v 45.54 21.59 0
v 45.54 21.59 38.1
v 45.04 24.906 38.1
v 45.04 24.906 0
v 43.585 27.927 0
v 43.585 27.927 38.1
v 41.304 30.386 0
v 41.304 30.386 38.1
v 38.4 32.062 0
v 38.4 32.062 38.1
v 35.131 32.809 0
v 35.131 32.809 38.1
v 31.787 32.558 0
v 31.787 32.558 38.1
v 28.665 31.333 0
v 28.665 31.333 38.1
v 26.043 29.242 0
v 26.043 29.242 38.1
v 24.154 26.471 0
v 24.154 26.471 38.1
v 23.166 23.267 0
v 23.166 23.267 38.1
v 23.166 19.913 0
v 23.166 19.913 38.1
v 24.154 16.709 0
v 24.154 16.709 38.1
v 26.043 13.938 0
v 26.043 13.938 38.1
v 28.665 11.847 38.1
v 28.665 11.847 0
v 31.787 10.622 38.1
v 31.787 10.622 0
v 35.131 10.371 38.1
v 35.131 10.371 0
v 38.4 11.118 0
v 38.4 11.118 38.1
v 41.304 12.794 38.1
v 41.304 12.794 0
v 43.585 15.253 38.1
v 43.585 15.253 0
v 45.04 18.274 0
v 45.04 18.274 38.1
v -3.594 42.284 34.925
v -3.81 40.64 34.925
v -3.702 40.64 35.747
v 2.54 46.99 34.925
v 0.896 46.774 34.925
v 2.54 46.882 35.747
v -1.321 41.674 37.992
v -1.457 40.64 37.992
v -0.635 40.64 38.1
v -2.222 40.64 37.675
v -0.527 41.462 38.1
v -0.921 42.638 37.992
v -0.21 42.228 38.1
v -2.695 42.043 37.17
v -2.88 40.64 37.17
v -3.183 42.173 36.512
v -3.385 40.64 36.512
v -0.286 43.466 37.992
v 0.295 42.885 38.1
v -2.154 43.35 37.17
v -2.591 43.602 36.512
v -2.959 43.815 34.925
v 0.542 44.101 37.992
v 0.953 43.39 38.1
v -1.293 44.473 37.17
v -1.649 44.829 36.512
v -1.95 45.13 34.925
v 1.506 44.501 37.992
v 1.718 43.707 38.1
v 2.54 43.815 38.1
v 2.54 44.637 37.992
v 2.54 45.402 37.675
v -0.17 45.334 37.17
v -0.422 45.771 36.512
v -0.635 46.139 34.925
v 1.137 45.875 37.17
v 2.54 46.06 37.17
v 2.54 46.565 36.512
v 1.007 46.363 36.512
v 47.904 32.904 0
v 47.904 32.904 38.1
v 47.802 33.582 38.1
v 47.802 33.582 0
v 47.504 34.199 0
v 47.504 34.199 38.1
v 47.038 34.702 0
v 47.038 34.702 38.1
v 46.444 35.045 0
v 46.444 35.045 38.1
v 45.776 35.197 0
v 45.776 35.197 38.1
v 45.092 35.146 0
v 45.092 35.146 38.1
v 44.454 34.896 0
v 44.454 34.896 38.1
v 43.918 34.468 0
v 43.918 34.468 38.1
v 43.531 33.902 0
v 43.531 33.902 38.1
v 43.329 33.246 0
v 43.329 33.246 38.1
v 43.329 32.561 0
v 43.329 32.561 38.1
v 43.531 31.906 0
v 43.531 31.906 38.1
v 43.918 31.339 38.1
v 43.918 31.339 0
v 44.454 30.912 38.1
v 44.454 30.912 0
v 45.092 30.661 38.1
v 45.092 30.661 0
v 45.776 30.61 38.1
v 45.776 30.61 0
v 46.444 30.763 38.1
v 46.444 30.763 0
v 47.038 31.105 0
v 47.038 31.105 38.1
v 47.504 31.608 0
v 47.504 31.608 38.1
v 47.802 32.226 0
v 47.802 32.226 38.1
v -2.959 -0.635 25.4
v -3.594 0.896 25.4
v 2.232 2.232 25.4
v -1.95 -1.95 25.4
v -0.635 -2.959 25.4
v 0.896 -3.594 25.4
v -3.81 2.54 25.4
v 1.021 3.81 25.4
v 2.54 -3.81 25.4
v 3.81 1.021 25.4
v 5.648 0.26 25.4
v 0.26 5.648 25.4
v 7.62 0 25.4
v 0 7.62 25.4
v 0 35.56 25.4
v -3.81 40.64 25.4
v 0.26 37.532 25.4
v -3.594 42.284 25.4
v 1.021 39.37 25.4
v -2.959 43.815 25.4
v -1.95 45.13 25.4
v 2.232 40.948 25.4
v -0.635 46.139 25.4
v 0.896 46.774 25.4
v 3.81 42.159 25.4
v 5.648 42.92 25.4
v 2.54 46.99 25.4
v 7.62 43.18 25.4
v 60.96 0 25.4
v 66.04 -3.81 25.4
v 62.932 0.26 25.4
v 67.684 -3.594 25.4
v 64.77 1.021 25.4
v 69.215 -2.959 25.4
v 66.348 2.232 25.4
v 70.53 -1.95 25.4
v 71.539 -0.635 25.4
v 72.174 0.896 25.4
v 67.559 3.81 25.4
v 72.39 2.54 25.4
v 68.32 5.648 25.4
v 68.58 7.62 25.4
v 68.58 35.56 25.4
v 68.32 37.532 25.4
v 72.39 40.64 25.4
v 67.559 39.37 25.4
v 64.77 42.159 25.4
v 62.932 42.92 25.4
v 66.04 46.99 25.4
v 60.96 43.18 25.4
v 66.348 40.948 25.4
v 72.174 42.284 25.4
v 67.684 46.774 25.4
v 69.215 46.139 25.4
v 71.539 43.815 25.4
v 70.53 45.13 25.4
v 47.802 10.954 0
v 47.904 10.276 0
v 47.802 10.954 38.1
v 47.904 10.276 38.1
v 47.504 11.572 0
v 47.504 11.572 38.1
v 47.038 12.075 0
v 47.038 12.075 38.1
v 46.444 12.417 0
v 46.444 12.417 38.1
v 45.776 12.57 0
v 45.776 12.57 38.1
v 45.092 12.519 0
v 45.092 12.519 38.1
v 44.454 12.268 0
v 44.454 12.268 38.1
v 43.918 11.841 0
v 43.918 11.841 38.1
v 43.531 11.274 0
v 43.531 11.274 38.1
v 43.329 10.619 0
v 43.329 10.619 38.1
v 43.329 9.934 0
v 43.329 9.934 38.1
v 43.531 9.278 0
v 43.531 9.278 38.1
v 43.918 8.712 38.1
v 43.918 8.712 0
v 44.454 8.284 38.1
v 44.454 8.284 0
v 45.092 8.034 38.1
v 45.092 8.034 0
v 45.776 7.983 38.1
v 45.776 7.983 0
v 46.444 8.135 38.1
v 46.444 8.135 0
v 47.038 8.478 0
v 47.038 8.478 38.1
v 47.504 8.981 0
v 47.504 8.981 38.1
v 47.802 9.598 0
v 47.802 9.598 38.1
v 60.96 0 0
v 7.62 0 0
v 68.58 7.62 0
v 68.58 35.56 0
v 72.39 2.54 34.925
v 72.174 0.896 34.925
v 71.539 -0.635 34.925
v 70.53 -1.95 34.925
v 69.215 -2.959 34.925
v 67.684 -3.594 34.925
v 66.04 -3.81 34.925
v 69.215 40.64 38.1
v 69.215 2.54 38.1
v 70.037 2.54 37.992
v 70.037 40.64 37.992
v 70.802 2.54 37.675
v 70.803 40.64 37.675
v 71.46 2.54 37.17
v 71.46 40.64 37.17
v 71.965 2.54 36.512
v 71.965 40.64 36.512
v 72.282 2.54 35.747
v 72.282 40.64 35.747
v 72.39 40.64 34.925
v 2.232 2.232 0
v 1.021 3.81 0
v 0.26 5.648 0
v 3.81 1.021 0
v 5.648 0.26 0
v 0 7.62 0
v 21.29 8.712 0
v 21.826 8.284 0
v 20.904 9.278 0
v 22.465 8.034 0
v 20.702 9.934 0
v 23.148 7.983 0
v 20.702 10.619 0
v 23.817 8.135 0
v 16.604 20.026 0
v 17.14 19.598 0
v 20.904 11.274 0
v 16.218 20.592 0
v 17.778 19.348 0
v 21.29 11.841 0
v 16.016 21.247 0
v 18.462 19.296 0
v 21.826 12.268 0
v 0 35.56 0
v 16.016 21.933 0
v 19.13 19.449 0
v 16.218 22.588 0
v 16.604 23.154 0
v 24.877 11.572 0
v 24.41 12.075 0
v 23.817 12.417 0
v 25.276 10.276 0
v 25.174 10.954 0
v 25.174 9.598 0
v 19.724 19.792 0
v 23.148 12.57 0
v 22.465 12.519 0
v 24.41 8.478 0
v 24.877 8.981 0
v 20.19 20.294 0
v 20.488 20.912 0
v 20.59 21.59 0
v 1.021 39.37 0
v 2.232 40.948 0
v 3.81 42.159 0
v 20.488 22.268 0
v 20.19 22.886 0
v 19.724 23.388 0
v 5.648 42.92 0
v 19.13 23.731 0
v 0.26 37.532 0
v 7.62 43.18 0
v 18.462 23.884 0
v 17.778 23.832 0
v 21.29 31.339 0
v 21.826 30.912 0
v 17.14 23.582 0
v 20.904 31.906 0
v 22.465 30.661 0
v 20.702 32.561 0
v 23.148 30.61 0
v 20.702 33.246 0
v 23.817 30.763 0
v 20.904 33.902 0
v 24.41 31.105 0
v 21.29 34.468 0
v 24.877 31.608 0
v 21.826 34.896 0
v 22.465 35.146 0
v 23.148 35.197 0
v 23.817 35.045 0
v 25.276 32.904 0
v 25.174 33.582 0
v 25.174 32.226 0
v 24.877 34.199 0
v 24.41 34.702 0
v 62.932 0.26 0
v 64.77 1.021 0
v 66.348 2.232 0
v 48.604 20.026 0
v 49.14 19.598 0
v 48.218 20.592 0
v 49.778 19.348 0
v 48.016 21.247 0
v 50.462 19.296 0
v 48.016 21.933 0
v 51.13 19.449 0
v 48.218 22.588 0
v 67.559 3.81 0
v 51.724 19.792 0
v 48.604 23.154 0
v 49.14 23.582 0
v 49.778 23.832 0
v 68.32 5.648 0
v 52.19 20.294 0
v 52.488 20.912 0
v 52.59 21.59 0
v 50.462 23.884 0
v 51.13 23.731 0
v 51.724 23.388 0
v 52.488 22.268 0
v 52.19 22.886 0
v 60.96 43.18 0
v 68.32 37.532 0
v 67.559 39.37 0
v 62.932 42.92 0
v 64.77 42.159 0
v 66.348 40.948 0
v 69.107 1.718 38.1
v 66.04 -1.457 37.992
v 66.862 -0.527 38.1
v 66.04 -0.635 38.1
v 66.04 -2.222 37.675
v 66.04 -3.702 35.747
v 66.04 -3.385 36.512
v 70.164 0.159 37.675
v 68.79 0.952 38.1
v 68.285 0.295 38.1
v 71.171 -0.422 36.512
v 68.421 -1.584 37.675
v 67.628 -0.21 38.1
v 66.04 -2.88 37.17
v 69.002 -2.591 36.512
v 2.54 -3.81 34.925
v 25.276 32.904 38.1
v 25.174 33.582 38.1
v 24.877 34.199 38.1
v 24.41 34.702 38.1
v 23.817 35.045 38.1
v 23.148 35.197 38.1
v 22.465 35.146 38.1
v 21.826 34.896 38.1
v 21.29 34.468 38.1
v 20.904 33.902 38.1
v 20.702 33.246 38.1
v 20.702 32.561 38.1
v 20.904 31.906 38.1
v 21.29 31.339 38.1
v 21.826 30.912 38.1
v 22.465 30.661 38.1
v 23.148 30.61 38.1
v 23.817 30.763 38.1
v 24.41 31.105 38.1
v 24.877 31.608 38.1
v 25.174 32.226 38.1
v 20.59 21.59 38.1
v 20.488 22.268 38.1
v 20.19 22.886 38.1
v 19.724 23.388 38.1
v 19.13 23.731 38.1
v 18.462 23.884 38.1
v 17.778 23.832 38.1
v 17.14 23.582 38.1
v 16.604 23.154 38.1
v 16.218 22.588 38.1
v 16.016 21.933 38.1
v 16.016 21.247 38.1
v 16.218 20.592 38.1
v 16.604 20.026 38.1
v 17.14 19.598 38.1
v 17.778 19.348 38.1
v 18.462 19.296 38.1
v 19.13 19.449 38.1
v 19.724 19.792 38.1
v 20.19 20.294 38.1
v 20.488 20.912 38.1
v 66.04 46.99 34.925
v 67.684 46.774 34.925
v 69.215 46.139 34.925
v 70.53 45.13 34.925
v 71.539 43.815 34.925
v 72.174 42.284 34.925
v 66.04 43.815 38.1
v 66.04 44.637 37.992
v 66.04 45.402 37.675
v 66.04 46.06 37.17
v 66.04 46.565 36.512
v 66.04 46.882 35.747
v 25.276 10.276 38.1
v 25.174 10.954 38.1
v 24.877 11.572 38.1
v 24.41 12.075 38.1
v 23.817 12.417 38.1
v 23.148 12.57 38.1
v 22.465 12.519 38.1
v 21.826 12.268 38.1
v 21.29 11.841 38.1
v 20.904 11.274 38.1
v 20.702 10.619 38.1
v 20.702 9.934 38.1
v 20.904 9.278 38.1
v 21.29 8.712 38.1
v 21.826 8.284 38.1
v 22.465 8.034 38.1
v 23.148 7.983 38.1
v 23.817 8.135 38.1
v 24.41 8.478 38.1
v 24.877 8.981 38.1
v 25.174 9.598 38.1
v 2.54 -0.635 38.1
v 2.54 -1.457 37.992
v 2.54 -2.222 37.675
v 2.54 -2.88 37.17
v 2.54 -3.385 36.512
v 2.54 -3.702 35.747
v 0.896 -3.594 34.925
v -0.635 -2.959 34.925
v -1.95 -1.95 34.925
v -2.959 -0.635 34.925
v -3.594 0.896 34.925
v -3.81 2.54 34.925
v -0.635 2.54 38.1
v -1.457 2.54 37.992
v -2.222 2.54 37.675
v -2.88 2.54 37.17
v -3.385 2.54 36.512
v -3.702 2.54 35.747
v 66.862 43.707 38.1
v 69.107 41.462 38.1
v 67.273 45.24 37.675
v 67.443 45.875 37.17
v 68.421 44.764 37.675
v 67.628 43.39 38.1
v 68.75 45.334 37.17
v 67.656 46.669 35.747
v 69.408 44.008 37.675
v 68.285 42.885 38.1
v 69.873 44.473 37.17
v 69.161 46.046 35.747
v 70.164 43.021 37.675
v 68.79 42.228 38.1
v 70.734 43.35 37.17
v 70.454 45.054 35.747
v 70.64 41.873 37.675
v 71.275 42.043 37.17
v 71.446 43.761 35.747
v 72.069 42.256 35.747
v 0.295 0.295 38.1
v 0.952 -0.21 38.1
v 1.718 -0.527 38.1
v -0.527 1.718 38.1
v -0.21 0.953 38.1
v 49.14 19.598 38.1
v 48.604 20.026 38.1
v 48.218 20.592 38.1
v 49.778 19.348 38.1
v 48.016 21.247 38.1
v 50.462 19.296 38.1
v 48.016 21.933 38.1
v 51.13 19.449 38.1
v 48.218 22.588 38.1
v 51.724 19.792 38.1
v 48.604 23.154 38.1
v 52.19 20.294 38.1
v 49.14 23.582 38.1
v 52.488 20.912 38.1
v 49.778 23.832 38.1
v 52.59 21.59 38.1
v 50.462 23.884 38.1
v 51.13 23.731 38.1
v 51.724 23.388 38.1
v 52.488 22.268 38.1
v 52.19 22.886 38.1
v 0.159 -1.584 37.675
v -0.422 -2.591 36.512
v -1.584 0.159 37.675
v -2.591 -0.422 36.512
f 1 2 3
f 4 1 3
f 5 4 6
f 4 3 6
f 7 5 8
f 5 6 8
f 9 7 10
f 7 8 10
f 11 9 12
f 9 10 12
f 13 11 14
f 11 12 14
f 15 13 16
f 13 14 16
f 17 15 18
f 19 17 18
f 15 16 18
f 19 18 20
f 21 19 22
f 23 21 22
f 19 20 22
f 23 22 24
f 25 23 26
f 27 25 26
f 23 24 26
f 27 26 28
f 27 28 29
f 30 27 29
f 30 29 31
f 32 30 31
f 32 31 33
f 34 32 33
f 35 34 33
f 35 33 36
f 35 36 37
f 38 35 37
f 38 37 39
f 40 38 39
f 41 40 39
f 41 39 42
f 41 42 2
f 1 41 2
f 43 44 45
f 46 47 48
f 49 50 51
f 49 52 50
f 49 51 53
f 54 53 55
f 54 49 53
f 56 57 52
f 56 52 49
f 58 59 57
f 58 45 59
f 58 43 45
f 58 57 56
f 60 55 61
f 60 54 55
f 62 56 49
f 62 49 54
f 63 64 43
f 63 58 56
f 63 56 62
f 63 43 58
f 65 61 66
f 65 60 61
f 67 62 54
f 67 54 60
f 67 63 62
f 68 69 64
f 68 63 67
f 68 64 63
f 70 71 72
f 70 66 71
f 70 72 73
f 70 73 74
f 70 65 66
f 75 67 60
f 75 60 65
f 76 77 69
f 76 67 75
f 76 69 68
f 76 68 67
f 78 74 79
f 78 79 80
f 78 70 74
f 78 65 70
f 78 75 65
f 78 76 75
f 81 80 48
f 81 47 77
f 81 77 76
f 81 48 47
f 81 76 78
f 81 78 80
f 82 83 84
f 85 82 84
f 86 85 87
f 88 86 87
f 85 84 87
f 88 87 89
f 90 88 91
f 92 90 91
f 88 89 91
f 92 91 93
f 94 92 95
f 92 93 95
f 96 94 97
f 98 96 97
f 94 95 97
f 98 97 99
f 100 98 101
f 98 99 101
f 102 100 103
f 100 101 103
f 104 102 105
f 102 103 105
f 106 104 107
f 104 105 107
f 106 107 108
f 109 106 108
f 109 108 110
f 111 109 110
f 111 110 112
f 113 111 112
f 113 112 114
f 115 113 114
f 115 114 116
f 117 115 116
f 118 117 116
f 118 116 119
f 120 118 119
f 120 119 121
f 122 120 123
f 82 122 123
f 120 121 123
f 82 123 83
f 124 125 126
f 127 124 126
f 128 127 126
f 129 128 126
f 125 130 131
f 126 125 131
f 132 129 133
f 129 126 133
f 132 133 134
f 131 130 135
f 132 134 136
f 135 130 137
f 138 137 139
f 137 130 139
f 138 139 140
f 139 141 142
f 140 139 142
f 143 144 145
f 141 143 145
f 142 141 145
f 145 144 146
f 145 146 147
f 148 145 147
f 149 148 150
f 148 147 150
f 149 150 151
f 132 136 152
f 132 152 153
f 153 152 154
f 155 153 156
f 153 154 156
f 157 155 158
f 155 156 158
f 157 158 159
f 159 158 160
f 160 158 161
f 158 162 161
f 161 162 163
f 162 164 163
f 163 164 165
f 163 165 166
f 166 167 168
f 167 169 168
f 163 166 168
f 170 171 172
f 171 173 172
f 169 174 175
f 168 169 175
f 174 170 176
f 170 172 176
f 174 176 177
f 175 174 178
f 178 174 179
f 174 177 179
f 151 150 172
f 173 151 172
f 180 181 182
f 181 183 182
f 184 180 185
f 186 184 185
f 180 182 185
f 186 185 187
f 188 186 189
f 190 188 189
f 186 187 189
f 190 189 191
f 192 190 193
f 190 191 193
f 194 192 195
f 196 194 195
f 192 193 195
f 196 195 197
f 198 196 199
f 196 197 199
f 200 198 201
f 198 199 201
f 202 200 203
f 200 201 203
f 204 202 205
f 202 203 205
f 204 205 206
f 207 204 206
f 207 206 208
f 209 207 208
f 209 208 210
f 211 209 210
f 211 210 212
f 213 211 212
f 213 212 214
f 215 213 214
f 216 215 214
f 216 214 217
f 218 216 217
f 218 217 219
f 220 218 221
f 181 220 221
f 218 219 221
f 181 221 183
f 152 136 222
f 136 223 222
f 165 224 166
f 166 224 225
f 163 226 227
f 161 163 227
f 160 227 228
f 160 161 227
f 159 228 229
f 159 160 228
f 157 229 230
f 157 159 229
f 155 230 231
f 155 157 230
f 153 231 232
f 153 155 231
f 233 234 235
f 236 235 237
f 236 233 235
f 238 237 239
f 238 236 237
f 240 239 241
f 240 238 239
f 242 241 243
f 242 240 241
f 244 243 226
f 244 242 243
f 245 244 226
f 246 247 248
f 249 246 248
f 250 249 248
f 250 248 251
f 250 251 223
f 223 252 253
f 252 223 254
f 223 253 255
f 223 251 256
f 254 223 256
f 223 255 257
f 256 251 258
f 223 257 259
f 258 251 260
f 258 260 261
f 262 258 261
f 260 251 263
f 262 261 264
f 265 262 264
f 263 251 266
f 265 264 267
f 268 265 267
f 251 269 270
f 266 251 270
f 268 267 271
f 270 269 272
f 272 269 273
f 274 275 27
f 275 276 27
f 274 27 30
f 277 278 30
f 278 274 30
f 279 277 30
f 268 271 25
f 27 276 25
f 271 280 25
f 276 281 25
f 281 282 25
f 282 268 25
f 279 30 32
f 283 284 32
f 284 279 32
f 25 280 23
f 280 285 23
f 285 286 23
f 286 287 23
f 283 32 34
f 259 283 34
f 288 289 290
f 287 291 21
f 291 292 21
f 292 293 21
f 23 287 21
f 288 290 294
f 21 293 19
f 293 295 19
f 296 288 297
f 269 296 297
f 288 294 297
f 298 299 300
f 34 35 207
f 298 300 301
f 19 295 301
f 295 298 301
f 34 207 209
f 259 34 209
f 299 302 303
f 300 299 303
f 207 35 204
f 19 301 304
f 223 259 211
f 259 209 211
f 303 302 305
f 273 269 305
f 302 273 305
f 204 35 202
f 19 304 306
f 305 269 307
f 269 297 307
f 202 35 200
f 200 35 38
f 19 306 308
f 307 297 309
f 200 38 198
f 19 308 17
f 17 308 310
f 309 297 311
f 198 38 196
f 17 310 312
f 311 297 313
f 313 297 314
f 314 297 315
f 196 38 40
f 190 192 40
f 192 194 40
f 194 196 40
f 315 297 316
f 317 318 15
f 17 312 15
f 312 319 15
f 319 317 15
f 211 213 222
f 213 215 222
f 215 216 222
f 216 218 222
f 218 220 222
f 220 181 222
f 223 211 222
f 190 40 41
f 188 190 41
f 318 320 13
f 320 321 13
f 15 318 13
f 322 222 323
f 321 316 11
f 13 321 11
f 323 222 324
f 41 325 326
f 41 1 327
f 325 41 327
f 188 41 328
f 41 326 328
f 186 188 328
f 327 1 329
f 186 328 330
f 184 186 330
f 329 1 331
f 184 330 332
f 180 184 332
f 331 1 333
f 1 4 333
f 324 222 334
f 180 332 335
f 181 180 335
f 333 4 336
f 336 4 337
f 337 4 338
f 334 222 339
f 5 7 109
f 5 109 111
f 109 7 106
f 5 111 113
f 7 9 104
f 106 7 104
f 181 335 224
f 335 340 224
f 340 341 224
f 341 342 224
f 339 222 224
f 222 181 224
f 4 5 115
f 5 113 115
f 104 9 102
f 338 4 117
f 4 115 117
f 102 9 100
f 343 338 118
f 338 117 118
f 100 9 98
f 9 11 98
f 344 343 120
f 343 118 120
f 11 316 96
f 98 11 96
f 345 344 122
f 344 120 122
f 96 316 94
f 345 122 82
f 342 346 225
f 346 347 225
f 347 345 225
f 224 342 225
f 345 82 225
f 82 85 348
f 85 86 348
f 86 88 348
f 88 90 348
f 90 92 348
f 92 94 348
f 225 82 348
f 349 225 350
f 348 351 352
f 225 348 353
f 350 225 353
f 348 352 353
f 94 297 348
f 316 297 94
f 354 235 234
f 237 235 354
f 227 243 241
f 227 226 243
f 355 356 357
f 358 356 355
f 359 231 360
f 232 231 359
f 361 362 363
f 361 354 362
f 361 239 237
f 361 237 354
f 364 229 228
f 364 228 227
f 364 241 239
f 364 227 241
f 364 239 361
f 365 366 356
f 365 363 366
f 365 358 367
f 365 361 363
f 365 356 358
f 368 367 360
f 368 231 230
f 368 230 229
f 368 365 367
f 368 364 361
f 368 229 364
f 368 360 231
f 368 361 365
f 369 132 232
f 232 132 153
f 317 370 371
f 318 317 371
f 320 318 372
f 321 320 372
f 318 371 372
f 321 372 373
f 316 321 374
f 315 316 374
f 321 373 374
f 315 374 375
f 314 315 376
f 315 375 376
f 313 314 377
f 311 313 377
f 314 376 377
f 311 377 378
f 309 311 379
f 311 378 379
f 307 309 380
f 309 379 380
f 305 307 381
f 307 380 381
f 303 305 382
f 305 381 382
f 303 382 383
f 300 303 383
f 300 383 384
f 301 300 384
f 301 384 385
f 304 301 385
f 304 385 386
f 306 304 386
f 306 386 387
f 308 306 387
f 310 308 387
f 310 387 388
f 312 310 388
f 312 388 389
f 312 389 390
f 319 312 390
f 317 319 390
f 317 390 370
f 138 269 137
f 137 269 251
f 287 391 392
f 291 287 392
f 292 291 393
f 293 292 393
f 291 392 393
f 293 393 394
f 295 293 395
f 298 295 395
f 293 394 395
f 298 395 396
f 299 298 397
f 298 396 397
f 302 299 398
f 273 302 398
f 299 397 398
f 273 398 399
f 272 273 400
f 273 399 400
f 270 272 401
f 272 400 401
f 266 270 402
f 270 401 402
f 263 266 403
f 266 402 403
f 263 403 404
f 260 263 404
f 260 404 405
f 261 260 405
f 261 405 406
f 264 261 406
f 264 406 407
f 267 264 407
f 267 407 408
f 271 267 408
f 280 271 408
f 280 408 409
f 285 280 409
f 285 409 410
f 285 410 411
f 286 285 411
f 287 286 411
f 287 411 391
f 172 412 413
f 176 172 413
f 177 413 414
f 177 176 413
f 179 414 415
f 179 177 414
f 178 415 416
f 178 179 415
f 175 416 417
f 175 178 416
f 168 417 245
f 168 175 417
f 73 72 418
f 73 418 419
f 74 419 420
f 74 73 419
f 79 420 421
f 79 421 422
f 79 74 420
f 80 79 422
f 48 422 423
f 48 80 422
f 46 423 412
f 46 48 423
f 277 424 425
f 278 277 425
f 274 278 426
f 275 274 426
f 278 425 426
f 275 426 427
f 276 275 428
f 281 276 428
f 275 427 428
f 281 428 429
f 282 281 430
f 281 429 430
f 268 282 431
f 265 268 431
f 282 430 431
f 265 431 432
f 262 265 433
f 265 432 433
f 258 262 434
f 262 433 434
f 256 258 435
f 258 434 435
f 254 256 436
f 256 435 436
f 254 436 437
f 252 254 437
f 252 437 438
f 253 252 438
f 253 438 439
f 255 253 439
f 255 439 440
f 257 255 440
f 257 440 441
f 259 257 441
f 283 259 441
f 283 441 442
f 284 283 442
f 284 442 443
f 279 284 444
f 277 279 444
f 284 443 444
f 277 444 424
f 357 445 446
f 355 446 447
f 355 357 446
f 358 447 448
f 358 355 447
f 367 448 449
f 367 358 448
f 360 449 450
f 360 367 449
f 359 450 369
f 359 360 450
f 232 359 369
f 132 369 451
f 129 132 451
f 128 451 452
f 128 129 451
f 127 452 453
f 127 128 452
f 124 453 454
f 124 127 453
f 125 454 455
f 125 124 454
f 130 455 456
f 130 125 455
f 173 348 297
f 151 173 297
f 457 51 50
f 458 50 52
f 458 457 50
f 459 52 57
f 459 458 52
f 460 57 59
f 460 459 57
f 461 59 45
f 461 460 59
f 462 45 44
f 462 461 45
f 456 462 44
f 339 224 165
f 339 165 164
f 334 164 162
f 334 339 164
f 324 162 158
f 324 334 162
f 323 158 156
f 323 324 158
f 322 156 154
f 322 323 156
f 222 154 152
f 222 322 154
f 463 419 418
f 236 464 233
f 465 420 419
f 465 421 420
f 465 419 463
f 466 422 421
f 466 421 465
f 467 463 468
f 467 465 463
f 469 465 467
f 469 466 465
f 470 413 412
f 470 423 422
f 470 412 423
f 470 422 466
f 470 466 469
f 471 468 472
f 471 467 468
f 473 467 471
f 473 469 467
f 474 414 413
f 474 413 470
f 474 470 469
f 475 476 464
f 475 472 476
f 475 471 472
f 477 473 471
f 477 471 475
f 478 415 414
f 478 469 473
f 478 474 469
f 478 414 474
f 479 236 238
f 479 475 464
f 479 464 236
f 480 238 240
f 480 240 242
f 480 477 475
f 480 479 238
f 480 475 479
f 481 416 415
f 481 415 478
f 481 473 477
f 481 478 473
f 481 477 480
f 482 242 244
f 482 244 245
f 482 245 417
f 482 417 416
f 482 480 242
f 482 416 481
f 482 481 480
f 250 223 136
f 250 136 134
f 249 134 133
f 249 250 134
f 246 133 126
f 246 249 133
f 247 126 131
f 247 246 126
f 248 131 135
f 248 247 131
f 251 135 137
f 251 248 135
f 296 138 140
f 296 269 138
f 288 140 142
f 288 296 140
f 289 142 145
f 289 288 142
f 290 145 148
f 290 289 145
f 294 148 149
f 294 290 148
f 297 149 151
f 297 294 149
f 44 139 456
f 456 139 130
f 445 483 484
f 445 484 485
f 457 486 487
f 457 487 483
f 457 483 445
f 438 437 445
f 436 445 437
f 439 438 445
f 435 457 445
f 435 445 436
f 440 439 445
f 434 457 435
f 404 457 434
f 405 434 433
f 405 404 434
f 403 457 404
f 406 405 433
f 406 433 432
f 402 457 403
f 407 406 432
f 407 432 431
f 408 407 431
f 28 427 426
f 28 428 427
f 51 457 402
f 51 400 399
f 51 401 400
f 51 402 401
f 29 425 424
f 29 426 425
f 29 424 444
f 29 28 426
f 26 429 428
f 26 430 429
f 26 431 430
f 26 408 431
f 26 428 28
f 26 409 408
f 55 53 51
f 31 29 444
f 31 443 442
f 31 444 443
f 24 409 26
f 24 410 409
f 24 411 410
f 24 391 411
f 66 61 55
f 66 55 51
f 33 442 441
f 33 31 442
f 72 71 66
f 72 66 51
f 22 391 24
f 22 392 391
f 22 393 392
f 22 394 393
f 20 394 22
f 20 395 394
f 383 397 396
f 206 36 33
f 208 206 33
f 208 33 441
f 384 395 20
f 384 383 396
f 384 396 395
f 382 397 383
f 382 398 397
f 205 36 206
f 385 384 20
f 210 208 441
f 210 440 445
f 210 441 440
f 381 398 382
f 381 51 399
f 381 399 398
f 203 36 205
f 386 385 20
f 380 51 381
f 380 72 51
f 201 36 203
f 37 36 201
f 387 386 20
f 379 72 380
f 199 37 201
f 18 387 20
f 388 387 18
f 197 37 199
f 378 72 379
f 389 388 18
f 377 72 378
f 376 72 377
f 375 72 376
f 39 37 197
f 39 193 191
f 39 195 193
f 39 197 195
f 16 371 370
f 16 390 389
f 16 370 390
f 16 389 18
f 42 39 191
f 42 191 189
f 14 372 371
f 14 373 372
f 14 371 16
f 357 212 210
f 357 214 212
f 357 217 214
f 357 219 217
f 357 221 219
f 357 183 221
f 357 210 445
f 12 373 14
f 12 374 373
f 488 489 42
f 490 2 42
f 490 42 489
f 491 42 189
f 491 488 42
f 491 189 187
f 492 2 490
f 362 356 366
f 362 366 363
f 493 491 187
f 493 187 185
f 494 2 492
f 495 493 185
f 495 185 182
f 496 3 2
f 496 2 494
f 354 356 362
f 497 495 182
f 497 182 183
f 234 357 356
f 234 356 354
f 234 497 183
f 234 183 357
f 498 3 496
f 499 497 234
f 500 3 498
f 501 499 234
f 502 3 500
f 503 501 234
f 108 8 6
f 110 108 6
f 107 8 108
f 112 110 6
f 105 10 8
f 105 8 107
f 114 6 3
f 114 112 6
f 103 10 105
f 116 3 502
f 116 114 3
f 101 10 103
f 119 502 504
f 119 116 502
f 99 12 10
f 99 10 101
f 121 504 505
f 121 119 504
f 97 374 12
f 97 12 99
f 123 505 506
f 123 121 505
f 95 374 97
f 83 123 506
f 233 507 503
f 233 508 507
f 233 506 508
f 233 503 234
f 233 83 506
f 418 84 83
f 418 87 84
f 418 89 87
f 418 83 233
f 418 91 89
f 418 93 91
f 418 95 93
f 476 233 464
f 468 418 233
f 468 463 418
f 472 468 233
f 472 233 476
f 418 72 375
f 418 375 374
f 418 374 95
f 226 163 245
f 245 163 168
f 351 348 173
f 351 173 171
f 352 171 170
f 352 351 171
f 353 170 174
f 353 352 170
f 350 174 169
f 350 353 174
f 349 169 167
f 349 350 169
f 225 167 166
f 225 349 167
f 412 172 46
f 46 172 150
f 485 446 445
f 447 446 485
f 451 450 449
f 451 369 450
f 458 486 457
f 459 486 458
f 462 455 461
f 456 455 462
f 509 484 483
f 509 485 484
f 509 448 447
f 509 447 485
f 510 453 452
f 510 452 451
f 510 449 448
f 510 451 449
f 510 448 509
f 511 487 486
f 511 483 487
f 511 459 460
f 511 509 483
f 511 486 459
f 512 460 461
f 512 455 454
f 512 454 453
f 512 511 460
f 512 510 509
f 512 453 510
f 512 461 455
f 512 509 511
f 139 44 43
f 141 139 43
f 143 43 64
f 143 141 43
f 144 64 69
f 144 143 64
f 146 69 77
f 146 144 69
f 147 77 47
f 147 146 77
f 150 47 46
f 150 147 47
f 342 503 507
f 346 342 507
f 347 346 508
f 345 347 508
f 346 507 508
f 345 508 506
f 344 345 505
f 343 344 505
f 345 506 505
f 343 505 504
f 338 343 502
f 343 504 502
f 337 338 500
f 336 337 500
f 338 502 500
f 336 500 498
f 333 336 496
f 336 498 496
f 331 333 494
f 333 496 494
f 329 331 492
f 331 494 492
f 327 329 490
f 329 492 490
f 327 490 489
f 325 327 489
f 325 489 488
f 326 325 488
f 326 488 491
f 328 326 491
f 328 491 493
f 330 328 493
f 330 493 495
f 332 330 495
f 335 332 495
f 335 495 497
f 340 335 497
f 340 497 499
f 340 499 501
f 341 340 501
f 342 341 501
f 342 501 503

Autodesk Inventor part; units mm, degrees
ref_plane "YZ Plane" through (0, 0, 0) normal (1, 0, 0) x (0, 1, 0)
ref_plane "XZ Plane" through (0, 0, 0) normal (0, 1, 0) x (-1, 0, 0)
ref_plane "XY Plane" through (0, 0, 0) normal (0, 0, 1) x (1, 0, 0)
sketch "Sketch1" plane through (0, 0, 0) normal (0, 0, 1) x (1, 0, 0)
  line L0 (7.62, 0) -> (60.96, 0)
  line L1 (68.58, 7.62) -> (68.58, 35.56)
  line L2 (60.96, 43.18) -> (7.62, 43.18)
  line L3 (0, 35.56) -> (0, 7.62)
  arc A0 (7.62, 43.18) -> (0, 35.56) centre (7.62, 35.56) ccw
  arc A1 (0, 7.62) -> (7.62, 0) centre (7.62, 7.62) ccw
  arc A2 (68.58, 35.56) -> (60.96, 43.18) centre (60.96, 35.56) ccw
  arc A3 (60.96, 0) -> (68.58, 7.62) centre (60.96, 7.62) ccw
  point P0 (0, 0)
  point P1 (68.58, 43.18)
  point P2 (68.58, 0)
  point P3 (0, 43.18)
  dimension "d0" = 68.58
  dimension "d1" = 43.18
  dimension "d3" = 7.62
extrude "Extrusion1" add sketch "Sketch1" along normal blind 25.4
sketch "Sketch2" plane through (0, 0, 25.4) normal (0, 0, 1) x (1, 0, 0)
  line L0 (2.54, -3.81) -> (66.04, -3.81)
  line L1 (72.39, 2.54) -> (72.39, 40.64)
  line L2 (66.04, 46.99) -> (2.54, 46.99)
  line L3 (-3.81, 40.64) -> (-3.81, 2.54)
  line L4 (60.96, 43.18) -> (7.62, 43.18) construction
  line L5 (0, 35.56) -> (0, 7.62) construction
  line L6 (7.62, 0) -> (60.96, 0) construction
  line L7 (68.58, 7.62) -> (68.58, 35.56) construction
  arc A0 (2.54, 46.99) -> (-3.81, 40.64) centre (2.54, 40.64) ccw
  arc A1 (-3.81, 2.54) -> (2.54, -3.81) centre (2.54, 2.54) ccw
  arc A2 (66.04, -3.81) -> (72.39, 2.54) centre (66.04, 2.54) ccw
  arc A3 (72.39, 40.64) -> (66.04, 46.99) centre (66.04, 40.64) ccw
  point P0 (0, 0)
  point P1 (72.39, 46.99)
  point P2 (72.39, -3.81)
  point P3 (-3.81, 46.99)
  point P4 (34.29, 46.99)
  point P5 (34.29, 43.18)
  point P6 (68.58, 21.59)
  point P7 (72.39, 21.59)
  dimension "d6" = 76.2
  dimension "d7" = 50.8
  dimension "d8" = 6.35
extrude "Extrusion2" add sketch "Sketch2" along normal blind 12.7
fillet "Fillet1" radius 3.175 8 edges at (-1.9501, 45.1301, 38.1) (-3.81, 21.59, 38.1) (-1.9501, -1.9501, 38.1) (34.29, -3.81, 38.1) (70.5301, -1.9501, 38.1) (72.39, 21.59, 38.1) (70.5301, 45.1301, 38.1) (34.29, 46.99, 38.1)
sketch "Sketch3" plane through (0, 0, 38.1) normal (0, 0, 1) x (1, 0, 0)
  circle A0 centre (34.29, 21.59) radius 11.25
  line L0 (-0.635, 2.54) -> (-0.635, 40.64) construction
  line L1 (2.54, 43.815) -> (66.04, 43.815) construction
  circle A1 centre (34.29, 21.59) radius 16 construction
  circle A2 centre (45.6037, 32.9037) radius 2.3
  circle A3 centre (18.29, 21.59) radius 2.3
  circle A4 centre (45.6037, 10.2763) radius 2.3
  circle A5 centre (50.29, 21.59) radius 2.3
  circle A6 centre (22.9763, 32.9037) radius 2.3
  circle A7 centre (22.9763, 10.2763) radius 2.3
  line L2 (22.9763, 32.9037) -> (34.29, 21.59) construction
  line L3 (34.29, 21.59) -> (18.29, 21.59) construction
  point P0 (0, 0)
  point P1 (34.29, 43.815)
  point P2 (-0.635, 21.59)
  dimension "d12" = 22.5
  dimension "d13" = 32
  dimension "d14" = 4.6
  dimension "d15" = 45
extrude "Extrusion3" cut sketch "Sketch3" against normal up to surface (38.1 mm away)
properties part number "2x3_Spacer"
